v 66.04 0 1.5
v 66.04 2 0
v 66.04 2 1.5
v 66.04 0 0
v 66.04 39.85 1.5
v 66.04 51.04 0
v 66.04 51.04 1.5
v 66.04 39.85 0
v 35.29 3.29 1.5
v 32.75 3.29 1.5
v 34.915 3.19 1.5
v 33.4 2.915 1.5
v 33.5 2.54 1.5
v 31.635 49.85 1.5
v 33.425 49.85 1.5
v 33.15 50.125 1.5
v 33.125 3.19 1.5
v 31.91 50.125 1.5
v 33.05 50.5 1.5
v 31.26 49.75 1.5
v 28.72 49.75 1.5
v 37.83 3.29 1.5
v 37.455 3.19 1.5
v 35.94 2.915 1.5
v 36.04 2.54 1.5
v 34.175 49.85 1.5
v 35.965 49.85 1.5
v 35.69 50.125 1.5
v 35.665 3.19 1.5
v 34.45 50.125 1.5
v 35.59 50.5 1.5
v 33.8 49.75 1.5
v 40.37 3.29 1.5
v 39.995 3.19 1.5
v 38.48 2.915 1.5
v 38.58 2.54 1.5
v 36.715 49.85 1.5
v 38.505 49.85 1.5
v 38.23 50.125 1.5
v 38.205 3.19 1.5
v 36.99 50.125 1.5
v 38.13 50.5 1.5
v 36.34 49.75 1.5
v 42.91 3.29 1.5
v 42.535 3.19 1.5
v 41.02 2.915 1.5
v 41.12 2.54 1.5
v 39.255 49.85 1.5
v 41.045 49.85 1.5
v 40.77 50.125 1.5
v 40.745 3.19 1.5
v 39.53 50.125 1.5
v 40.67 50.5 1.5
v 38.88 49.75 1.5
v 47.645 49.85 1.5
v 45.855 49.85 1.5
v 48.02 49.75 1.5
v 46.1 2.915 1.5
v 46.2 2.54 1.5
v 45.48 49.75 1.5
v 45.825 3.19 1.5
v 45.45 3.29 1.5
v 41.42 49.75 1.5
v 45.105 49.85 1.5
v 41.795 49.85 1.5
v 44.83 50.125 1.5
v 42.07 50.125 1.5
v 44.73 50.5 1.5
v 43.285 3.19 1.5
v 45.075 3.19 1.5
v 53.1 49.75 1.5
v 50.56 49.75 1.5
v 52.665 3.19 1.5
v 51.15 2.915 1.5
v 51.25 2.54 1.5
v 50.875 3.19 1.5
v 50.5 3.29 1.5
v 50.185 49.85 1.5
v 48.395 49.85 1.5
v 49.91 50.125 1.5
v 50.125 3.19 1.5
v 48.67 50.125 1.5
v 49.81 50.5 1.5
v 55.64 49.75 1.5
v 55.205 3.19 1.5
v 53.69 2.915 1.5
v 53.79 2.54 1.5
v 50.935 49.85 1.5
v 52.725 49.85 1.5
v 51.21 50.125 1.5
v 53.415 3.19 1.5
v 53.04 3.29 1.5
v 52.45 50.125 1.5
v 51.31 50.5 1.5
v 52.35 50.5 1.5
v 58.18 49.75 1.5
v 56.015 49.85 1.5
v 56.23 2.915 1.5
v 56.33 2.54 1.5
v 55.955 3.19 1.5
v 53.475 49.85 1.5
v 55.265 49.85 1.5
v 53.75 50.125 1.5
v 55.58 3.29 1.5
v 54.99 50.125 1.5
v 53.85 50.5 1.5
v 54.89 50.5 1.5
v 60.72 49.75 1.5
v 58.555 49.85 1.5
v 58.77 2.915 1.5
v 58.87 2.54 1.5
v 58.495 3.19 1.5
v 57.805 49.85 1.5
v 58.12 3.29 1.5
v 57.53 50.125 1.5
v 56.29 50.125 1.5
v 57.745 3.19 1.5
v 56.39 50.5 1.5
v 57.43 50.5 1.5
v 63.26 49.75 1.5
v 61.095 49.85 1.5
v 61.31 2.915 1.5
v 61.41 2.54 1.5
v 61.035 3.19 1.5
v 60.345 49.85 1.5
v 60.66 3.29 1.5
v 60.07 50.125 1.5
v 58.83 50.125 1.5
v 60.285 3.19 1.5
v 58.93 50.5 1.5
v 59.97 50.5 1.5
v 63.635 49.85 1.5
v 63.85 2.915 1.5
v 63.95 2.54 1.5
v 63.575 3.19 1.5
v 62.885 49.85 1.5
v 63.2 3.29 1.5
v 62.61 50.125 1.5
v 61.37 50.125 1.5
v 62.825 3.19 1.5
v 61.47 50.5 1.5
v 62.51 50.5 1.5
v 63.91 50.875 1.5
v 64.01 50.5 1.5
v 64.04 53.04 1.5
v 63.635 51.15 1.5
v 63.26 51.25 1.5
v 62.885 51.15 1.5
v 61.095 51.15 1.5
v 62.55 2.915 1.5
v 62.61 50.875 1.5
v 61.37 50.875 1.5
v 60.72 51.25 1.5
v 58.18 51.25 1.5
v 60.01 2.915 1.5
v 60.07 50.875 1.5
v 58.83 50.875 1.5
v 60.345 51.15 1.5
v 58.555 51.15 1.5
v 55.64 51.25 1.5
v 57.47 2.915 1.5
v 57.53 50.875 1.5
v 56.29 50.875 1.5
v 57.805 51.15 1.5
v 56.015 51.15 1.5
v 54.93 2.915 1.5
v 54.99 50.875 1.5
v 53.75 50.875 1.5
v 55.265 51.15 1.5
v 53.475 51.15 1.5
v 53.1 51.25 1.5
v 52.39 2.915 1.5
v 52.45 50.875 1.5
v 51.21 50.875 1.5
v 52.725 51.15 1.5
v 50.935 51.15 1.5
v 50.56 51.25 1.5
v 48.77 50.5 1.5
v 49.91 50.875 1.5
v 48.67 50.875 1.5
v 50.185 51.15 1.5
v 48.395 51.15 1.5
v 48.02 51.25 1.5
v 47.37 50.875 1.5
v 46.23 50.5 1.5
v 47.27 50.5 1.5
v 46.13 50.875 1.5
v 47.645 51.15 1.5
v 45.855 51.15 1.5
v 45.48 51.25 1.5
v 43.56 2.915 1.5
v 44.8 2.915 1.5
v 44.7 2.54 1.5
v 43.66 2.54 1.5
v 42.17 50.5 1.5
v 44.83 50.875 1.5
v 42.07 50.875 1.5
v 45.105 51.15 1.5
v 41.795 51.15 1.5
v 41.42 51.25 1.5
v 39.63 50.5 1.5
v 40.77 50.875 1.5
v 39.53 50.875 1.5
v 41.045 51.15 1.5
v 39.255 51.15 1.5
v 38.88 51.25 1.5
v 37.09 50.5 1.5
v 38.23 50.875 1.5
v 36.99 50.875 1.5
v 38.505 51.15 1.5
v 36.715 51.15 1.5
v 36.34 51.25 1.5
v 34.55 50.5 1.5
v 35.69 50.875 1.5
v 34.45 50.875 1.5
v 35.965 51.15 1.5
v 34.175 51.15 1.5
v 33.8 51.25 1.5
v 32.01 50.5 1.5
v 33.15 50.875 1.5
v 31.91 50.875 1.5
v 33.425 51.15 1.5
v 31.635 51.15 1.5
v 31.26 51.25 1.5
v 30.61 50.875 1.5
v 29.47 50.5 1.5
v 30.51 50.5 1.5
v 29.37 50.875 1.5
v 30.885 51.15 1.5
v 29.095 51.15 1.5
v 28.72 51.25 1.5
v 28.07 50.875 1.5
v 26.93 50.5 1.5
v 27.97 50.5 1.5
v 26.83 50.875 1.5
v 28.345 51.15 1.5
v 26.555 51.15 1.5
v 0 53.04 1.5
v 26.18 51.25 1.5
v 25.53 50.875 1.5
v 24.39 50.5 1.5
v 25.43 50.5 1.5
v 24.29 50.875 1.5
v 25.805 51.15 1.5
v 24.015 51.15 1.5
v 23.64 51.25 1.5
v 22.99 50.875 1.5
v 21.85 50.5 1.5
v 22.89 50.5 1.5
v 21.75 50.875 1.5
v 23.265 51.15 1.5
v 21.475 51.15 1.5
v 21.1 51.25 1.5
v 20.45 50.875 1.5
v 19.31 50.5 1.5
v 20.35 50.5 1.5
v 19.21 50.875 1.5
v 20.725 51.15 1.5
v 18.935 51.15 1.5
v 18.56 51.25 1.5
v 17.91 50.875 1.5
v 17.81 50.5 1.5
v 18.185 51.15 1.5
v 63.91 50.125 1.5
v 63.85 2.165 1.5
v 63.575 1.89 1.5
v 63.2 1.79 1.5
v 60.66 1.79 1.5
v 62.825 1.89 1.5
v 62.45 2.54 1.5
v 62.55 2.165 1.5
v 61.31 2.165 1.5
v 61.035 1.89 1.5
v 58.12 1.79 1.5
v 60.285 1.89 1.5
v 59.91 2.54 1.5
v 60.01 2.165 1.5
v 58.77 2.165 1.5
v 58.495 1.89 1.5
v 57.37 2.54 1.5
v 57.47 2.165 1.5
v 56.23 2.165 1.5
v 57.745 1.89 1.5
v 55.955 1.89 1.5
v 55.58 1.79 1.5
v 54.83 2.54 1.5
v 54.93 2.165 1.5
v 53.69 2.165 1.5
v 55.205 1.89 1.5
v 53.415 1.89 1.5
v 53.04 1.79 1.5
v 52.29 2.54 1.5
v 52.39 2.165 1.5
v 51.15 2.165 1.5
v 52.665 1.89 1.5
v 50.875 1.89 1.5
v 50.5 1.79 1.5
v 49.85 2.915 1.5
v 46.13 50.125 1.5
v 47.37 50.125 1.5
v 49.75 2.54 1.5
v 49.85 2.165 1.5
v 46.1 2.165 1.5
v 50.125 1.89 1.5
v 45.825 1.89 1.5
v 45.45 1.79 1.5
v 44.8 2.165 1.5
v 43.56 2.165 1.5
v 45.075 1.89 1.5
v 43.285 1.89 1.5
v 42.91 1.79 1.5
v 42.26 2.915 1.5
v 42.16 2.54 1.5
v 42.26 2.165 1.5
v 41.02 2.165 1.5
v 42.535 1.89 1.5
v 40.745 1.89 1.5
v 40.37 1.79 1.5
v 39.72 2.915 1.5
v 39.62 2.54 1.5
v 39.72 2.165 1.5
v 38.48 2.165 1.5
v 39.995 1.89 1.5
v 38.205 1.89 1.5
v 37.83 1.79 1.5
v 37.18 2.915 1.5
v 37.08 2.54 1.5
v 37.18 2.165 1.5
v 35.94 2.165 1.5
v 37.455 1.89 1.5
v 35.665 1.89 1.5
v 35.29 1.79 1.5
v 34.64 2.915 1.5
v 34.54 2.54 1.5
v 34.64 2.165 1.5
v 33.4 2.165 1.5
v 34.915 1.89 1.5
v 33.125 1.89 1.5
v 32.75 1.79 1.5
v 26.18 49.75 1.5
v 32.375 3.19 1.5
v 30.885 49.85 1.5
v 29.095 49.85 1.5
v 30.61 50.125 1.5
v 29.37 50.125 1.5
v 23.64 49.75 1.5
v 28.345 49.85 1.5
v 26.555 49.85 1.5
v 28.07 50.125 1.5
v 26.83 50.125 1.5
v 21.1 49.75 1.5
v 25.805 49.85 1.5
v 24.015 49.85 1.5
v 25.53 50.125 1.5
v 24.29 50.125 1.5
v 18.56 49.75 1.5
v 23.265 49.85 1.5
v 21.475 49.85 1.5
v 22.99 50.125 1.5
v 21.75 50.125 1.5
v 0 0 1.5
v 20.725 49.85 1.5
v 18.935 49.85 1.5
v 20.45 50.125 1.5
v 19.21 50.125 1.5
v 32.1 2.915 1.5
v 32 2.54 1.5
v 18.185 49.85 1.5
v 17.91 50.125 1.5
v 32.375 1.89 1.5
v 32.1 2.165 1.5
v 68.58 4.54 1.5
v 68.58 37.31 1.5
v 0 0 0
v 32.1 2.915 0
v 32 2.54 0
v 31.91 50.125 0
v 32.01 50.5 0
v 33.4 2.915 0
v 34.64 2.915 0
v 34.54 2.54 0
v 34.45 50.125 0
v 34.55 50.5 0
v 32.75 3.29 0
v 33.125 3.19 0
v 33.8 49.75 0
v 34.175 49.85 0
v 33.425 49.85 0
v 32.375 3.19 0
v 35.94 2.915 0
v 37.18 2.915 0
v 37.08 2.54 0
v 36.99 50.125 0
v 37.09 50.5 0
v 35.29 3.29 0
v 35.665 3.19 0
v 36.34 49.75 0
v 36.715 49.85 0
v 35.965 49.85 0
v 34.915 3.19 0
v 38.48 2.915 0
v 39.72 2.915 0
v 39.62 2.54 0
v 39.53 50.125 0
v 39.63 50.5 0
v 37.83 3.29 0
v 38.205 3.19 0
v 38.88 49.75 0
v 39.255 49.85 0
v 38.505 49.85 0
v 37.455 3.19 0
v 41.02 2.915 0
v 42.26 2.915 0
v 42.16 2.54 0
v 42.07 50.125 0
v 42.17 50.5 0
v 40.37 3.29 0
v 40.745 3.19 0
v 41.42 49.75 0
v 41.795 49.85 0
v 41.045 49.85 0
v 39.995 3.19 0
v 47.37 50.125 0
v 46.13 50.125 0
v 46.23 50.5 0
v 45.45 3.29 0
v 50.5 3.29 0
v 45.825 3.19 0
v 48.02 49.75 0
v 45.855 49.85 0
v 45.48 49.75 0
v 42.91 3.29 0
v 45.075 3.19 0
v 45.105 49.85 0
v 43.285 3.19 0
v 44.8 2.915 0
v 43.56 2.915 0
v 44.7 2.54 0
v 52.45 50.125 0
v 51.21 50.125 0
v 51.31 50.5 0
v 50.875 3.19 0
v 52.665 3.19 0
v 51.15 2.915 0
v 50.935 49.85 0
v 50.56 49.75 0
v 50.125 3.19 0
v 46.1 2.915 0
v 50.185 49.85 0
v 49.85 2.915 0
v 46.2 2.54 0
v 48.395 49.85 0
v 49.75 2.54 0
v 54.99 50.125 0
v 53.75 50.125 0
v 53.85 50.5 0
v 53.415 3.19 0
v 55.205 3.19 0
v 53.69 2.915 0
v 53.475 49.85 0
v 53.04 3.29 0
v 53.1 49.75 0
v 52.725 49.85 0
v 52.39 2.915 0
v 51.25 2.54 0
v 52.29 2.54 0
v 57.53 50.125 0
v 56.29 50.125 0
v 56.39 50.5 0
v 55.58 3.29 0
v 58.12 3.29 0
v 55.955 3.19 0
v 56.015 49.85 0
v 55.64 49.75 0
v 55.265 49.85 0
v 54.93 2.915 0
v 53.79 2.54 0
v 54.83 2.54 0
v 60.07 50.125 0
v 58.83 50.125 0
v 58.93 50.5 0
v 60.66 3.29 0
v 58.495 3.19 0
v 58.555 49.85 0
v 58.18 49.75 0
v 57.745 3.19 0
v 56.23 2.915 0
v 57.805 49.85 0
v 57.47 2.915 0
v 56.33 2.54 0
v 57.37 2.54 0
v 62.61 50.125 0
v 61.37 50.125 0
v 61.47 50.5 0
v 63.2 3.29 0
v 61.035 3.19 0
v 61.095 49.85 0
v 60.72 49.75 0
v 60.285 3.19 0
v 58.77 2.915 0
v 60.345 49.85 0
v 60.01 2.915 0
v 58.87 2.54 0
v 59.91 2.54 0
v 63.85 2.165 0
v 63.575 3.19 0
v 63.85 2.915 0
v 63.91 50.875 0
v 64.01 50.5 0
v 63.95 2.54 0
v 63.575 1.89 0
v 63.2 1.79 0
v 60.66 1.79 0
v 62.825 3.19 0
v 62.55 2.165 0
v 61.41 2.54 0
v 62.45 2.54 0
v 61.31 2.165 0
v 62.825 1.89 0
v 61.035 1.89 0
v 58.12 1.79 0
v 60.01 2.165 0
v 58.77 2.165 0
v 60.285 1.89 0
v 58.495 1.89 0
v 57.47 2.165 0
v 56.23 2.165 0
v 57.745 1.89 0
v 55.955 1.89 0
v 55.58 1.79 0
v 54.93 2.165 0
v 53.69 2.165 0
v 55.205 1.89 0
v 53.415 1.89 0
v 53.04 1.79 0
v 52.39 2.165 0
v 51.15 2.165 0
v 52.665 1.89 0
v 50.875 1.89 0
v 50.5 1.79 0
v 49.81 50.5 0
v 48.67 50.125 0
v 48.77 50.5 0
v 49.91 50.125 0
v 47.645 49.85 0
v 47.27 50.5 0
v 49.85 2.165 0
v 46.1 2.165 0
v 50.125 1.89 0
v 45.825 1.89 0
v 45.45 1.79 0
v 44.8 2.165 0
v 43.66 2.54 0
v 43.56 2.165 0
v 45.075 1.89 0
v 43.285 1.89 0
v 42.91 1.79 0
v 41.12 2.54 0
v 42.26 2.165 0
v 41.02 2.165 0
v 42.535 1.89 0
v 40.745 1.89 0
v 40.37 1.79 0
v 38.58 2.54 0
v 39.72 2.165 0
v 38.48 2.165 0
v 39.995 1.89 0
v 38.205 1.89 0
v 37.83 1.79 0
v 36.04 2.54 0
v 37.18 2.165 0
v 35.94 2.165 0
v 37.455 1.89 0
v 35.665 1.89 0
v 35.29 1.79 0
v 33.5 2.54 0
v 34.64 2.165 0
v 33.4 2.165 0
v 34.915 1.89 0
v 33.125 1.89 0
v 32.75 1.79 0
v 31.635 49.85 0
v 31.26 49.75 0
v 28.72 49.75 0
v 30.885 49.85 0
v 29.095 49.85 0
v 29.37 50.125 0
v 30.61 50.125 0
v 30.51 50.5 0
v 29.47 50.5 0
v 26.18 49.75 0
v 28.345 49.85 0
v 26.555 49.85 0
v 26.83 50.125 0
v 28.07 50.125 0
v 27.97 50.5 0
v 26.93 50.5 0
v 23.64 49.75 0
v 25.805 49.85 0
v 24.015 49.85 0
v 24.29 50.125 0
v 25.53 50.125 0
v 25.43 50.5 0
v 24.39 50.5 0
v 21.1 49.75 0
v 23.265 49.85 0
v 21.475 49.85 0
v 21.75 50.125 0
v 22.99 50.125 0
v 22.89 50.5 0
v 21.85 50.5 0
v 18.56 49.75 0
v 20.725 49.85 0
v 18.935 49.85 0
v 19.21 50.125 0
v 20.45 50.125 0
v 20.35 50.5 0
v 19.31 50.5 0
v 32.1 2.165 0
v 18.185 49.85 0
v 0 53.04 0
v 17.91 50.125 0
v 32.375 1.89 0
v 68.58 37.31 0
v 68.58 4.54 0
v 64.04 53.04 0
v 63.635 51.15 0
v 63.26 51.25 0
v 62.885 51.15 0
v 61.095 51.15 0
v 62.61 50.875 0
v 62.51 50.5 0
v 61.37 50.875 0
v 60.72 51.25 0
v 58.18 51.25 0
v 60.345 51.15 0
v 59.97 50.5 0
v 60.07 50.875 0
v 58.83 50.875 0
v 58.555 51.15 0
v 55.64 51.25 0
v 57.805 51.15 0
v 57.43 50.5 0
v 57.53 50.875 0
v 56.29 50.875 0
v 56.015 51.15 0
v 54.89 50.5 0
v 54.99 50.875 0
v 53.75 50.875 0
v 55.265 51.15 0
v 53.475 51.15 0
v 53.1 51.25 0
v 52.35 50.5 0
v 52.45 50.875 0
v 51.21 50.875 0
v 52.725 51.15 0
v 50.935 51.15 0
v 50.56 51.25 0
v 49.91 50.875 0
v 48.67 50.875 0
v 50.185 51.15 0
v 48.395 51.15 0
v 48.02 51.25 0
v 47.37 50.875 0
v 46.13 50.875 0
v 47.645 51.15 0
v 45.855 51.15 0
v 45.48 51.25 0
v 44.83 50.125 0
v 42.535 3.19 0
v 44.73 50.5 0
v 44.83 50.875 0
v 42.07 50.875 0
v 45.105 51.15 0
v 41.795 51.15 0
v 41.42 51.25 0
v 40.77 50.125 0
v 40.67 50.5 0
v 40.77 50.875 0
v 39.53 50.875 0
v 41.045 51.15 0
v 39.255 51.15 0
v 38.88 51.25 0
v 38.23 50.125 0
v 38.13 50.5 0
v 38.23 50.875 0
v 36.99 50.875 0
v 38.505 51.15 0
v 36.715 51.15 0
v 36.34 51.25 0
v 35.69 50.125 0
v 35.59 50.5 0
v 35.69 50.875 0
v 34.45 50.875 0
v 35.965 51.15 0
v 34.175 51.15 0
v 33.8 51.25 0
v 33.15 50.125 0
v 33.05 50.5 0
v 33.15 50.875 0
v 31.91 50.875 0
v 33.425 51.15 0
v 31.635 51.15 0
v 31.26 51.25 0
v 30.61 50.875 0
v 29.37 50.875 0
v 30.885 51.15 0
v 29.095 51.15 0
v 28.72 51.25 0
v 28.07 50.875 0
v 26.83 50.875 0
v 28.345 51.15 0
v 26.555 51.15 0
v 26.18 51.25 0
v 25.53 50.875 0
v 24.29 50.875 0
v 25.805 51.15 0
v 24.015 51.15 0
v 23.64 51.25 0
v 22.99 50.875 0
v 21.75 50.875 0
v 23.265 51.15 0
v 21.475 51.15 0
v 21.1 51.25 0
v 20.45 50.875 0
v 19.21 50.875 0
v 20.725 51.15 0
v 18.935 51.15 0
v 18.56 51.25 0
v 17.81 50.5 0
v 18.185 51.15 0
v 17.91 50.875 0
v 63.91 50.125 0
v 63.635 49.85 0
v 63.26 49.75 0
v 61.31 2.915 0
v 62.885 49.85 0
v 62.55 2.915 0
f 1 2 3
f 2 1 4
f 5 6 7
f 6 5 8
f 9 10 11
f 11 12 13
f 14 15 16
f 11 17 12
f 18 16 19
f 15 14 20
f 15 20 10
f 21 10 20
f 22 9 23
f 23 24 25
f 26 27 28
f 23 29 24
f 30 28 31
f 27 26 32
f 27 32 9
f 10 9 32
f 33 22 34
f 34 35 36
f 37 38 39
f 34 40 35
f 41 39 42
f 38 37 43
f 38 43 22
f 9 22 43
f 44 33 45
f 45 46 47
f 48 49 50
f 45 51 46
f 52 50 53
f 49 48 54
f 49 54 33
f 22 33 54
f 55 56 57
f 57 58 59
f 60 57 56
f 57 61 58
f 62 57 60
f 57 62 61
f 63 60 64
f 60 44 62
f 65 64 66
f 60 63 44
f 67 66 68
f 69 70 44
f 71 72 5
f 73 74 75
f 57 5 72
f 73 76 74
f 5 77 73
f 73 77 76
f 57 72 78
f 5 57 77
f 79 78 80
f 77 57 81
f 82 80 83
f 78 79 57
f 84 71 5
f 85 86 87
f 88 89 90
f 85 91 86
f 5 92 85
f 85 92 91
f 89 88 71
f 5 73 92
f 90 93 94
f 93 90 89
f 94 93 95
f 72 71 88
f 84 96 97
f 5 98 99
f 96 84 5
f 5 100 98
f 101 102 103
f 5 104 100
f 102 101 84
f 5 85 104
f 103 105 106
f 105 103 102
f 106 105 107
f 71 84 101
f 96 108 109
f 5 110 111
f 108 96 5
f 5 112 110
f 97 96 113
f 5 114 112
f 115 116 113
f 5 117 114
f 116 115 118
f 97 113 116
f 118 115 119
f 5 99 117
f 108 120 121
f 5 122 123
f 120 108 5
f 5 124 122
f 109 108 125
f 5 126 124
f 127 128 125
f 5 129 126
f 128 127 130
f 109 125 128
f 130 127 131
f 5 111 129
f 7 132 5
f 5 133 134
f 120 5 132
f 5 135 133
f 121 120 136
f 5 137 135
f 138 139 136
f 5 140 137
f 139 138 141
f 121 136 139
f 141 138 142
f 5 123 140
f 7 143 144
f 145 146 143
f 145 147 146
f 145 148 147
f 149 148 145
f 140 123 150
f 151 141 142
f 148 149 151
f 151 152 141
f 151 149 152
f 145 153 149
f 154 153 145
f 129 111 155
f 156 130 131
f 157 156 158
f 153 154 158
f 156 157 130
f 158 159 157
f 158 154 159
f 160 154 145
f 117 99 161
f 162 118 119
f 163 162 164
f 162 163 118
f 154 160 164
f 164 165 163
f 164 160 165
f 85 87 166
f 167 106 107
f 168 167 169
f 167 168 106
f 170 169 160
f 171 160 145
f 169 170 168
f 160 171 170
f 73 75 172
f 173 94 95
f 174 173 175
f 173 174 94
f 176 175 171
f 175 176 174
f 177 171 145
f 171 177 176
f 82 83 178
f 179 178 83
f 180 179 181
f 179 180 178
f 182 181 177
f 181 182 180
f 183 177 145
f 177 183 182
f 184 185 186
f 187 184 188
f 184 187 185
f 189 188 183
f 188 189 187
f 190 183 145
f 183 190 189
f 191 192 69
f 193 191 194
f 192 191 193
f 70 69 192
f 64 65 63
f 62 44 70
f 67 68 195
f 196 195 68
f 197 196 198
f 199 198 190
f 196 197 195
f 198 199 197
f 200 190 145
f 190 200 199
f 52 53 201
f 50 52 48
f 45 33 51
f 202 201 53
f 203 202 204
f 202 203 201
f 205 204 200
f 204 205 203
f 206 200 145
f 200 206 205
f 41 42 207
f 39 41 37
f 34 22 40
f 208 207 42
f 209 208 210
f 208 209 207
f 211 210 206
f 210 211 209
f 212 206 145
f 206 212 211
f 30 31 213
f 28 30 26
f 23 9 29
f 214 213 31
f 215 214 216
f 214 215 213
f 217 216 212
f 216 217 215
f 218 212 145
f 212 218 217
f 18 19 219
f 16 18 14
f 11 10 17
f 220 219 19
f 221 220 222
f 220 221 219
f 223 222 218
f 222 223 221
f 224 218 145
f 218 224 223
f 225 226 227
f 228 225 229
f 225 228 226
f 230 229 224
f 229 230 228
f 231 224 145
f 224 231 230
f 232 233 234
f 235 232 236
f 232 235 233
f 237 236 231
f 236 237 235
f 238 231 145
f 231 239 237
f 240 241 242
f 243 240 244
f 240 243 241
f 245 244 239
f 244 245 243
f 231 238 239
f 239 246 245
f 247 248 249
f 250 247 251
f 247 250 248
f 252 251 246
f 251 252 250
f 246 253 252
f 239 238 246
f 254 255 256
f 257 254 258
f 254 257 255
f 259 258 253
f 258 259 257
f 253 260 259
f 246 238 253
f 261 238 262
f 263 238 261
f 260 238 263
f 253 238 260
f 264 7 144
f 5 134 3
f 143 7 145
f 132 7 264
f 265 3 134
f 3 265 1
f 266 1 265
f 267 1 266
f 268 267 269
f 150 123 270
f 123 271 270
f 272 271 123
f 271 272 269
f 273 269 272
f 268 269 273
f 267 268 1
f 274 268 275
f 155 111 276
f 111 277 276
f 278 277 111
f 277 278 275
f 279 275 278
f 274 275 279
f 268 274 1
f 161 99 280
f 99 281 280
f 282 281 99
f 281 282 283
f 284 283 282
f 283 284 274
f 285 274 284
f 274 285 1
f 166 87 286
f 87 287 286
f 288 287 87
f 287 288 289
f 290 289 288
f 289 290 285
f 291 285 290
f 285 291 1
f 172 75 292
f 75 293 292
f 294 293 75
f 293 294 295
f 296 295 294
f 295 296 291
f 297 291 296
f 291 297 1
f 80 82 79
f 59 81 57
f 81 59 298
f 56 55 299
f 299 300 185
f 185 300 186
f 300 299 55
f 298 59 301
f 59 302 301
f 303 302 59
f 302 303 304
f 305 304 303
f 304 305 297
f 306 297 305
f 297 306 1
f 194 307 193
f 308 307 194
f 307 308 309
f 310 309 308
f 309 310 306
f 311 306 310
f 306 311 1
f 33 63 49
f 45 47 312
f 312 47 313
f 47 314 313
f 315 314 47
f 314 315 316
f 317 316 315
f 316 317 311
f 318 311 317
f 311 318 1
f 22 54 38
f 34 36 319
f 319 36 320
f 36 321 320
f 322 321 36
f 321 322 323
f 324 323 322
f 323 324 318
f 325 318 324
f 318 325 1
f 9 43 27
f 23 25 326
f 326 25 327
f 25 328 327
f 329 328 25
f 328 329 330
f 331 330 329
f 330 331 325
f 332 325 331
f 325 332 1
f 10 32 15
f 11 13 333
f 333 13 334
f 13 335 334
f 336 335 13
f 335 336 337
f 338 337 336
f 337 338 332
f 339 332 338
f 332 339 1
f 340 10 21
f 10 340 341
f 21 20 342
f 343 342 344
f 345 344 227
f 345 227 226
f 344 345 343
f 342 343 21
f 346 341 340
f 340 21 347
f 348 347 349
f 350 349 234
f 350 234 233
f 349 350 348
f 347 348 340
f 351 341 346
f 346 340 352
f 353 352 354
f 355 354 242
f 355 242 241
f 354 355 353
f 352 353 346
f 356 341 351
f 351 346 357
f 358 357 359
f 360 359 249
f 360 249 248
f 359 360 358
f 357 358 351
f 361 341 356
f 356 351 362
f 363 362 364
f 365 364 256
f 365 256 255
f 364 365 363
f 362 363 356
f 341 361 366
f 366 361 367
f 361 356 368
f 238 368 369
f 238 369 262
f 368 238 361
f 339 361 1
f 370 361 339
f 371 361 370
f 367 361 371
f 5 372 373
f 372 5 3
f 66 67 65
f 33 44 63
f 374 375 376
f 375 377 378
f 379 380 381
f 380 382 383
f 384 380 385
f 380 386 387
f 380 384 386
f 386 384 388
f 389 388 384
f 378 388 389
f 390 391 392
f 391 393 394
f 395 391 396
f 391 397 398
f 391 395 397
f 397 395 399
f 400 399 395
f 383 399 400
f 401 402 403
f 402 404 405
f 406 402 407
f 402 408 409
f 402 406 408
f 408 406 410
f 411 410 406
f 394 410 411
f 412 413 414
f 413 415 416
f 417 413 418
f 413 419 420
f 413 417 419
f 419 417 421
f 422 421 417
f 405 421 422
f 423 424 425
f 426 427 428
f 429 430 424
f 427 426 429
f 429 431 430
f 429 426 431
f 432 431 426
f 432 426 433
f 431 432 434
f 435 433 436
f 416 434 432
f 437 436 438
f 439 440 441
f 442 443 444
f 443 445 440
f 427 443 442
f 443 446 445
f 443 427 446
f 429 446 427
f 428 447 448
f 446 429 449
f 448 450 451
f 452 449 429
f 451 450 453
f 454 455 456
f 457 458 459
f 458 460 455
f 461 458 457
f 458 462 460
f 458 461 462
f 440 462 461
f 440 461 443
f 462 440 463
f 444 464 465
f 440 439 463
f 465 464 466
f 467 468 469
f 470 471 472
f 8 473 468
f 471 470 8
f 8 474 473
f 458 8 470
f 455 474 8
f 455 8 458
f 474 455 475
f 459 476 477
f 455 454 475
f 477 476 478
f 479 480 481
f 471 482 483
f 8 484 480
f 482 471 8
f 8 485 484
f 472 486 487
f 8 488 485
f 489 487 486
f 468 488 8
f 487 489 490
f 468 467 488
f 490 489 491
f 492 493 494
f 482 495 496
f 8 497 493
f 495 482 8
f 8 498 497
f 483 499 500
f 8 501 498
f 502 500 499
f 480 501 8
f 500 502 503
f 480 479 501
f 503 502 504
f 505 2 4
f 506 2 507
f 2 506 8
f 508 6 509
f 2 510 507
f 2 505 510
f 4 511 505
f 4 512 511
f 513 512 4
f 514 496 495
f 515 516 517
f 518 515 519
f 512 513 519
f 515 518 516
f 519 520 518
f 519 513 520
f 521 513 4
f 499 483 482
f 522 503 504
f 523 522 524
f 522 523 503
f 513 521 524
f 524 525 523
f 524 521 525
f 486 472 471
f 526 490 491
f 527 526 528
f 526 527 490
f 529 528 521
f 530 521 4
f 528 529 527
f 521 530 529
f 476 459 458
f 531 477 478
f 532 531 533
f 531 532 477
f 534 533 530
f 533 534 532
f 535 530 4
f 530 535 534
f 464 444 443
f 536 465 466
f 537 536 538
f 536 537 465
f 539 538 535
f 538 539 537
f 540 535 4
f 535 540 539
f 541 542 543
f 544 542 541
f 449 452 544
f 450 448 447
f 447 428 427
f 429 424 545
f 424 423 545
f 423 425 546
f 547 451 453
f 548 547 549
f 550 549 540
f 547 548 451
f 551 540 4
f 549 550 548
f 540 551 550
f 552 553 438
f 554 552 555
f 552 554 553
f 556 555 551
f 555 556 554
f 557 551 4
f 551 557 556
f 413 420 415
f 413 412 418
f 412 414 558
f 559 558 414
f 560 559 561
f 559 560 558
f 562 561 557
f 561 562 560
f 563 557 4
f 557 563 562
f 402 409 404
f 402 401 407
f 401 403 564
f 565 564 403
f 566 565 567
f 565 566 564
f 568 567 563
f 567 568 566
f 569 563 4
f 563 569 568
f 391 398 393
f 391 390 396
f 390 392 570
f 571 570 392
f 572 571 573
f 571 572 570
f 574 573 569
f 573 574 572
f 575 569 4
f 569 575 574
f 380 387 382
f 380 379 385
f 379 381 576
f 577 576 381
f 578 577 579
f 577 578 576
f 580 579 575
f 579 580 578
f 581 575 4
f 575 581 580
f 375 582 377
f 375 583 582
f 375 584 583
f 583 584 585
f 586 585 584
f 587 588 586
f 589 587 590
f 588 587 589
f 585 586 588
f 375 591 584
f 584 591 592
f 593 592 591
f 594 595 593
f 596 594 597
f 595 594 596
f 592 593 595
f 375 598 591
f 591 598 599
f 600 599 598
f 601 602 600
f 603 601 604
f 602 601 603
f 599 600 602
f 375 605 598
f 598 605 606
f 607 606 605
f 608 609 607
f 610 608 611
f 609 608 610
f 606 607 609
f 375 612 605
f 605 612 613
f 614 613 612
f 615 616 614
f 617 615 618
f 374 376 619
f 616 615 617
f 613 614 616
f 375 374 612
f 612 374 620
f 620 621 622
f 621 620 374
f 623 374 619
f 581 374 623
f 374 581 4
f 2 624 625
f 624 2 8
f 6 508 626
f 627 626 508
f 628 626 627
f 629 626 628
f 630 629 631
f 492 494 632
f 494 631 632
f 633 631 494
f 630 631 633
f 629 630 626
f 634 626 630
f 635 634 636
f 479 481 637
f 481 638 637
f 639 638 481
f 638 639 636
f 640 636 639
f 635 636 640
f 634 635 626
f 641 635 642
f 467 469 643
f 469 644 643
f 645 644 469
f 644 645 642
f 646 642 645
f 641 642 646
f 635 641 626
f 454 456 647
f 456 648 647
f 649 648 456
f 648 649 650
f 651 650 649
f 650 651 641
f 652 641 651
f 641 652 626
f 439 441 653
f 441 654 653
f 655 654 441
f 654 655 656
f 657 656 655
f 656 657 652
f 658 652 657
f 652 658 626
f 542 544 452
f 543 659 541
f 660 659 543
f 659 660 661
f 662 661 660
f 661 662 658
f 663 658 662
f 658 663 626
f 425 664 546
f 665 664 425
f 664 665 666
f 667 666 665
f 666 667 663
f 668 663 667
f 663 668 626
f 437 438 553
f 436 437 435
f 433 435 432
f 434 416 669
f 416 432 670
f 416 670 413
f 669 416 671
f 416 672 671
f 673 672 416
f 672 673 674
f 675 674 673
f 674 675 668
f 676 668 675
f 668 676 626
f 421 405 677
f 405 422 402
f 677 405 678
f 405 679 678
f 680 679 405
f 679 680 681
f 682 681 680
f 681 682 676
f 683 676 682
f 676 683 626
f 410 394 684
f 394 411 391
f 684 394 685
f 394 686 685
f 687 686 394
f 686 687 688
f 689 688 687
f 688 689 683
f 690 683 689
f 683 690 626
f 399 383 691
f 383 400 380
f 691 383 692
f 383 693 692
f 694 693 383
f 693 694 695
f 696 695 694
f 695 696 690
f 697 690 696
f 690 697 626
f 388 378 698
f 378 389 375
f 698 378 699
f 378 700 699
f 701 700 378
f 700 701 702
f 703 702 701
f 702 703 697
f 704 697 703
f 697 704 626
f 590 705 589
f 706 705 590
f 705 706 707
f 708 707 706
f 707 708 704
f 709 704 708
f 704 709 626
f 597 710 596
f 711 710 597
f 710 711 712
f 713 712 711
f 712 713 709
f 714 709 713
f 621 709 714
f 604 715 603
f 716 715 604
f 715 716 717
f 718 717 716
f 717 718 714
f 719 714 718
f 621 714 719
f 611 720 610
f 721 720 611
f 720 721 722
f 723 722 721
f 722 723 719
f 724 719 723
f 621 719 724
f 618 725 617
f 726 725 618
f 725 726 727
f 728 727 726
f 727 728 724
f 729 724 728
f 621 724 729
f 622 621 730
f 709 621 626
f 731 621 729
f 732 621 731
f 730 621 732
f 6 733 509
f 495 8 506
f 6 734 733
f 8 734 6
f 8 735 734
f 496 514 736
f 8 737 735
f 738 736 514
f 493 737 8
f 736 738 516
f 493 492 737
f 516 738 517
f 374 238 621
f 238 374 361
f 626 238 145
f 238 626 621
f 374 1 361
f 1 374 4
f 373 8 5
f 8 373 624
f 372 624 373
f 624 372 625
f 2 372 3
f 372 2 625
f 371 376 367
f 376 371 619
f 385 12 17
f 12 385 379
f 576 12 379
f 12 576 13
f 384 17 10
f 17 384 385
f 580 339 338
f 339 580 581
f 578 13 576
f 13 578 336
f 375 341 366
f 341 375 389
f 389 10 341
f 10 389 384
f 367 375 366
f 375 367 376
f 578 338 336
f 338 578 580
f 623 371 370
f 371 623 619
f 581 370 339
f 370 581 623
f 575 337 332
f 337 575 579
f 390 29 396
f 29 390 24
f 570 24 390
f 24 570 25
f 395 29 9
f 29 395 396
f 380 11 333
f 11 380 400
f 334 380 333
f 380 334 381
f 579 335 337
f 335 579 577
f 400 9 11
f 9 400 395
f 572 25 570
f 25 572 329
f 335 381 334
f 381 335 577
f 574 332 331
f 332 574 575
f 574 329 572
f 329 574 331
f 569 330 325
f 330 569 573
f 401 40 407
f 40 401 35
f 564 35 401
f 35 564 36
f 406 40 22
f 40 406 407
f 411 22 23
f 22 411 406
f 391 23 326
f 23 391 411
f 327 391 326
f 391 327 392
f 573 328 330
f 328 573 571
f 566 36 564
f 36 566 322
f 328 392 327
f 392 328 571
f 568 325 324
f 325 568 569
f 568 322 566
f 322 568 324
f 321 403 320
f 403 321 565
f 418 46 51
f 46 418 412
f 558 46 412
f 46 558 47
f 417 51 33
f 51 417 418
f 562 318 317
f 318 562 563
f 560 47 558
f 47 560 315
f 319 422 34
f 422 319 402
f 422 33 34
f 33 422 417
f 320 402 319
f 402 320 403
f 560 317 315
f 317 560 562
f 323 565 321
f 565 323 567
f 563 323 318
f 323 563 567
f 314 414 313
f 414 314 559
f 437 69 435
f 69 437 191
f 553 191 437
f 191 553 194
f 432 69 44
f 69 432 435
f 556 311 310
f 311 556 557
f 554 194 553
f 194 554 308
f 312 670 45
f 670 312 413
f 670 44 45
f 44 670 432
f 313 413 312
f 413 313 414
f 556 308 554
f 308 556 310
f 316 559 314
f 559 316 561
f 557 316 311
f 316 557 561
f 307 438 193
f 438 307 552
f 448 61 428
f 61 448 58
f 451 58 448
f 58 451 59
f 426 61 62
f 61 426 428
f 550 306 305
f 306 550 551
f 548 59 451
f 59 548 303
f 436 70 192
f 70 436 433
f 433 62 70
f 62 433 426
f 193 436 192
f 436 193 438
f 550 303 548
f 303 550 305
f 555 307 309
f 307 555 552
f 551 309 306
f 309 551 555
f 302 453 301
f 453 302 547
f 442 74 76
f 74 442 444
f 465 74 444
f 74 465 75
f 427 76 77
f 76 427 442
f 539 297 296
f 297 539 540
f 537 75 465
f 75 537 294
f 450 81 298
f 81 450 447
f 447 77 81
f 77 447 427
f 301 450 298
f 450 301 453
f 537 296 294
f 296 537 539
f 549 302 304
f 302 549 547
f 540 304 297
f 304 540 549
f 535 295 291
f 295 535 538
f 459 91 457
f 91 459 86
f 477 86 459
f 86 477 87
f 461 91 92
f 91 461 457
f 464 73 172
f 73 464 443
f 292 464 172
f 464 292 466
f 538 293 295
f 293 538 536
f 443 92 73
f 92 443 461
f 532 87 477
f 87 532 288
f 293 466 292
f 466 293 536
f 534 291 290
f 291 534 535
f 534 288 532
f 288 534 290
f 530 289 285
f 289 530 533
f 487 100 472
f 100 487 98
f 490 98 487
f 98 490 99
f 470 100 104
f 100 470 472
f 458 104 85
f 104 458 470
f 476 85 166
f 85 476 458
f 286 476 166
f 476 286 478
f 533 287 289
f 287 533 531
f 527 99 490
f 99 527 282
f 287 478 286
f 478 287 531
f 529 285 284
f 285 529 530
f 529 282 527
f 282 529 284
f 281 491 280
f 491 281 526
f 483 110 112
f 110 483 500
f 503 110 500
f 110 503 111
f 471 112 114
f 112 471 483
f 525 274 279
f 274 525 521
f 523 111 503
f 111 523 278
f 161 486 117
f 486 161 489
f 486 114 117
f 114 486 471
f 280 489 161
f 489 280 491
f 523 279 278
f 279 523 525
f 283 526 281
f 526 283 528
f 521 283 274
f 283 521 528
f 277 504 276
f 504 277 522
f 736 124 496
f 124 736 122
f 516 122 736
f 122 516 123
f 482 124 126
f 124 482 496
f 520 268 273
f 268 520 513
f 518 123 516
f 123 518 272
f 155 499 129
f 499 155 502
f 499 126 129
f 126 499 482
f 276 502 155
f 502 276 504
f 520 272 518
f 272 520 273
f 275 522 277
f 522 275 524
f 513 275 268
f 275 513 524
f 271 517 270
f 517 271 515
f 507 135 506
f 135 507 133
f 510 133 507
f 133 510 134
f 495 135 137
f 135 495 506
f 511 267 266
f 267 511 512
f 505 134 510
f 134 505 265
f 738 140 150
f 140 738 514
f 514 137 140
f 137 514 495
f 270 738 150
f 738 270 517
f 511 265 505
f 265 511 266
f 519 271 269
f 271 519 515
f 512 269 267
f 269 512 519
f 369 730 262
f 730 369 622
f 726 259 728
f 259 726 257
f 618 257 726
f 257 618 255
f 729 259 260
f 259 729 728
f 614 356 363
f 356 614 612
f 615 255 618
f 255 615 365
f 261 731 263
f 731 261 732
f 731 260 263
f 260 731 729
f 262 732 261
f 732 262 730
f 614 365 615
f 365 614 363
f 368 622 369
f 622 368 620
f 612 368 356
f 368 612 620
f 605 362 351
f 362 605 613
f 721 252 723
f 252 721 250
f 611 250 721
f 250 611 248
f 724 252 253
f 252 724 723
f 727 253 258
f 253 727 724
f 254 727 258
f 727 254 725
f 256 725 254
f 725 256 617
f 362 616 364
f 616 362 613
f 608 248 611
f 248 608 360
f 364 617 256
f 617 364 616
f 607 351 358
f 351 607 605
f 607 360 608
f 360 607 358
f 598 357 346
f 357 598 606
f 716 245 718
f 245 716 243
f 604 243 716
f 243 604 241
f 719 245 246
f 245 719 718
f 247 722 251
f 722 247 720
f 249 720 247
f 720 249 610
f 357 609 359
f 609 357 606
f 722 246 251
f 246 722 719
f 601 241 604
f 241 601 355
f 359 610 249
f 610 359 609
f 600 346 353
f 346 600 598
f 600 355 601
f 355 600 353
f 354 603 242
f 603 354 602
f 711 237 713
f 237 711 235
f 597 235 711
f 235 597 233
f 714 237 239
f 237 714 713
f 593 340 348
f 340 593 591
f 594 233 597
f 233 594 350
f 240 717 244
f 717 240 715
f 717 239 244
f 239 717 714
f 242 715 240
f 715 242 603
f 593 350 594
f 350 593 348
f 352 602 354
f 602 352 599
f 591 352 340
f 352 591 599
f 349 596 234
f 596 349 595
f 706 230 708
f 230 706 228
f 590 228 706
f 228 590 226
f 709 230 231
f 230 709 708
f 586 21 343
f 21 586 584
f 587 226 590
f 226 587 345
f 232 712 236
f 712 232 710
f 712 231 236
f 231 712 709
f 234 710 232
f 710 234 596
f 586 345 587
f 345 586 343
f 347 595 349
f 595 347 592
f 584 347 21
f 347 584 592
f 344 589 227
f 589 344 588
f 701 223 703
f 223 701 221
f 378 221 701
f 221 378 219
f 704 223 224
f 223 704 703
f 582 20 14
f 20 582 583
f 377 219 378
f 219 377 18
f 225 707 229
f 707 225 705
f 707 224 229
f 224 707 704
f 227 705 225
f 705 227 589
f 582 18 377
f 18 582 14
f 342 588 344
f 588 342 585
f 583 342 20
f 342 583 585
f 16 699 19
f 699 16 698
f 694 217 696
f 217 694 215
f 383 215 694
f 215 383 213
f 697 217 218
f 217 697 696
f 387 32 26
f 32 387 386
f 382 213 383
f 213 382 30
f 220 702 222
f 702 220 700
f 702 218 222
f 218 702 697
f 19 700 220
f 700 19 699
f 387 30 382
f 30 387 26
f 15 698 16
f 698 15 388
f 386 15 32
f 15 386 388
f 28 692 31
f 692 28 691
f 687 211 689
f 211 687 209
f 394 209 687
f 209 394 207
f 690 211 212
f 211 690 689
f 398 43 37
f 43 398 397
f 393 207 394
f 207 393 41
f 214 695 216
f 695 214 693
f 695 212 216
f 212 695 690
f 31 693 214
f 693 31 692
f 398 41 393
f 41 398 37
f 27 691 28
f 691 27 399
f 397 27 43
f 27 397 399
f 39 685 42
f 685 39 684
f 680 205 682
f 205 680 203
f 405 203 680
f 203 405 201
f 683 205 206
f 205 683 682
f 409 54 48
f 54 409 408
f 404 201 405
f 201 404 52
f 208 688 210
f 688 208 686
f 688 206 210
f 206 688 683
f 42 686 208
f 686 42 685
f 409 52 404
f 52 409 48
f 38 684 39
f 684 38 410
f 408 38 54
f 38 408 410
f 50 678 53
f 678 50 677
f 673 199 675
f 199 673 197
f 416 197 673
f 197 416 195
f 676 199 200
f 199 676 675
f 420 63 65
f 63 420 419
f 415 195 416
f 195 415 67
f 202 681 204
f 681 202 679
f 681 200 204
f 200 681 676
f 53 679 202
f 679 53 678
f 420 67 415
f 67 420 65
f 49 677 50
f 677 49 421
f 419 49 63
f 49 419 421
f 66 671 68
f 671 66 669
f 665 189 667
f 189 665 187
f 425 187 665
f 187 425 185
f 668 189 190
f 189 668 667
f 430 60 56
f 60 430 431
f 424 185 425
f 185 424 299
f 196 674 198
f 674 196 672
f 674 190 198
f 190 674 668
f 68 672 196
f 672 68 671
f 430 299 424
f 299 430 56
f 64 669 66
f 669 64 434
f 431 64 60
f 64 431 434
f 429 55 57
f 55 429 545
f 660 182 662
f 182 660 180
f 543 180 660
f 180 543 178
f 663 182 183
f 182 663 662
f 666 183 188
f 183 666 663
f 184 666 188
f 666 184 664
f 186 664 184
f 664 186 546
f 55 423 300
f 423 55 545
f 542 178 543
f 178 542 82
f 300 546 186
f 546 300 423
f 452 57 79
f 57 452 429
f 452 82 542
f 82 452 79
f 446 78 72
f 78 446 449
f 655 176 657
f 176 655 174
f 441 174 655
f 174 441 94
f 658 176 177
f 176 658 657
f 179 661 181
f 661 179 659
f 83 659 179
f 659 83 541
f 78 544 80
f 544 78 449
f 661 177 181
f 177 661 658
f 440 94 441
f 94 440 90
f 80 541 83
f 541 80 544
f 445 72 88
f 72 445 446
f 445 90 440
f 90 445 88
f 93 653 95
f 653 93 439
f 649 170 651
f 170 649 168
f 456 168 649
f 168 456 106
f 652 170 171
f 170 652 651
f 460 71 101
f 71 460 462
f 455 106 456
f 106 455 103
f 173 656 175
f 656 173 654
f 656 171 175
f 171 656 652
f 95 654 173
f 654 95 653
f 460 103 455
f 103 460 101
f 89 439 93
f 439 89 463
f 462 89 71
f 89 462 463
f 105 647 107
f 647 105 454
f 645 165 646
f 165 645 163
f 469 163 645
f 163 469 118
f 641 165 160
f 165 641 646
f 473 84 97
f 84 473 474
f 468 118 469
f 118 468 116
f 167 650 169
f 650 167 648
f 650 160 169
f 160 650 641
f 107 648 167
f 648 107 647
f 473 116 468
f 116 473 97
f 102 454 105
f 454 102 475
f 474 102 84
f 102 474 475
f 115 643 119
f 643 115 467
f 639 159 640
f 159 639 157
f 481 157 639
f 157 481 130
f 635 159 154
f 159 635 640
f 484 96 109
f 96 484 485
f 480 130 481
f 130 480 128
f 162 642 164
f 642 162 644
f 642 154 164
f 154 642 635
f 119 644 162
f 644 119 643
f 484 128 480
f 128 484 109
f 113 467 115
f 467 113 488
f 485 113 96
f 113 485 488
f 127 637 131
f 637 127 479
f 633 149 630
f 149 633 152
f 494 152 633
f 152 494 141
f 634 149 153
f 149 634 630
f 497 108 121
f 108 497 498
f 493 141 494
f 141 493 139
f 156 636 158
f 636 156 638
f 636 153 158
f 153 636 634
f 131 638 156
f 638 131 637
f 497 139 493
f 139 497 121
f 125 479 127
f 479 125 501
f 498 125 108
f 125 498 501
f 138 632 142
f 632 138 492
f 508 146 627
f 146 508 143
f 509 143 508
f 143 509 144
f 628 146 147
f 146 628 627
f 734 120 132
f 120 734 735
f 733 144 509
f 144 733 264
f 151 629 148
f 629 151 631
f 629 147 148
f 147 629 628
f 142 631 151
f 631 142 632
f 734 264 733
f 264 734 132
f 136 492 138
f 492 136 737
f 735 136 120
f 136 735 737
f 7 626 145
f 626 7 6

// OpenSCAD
shield_UNO(1.5);

module shield_UNO(h)
{
difference(){
union(){
cube([66.04,50.5+2.54,h]);
translate([65.04,2,0])hull(){
cube([1,37.85,h]);
translate([1,2.54,0])cube([2.54,32.77,h]);
}
}
$fn=12;
translate([32.75,2.54,-1])pin20mil(6,1.5,h+2);
translate([50.5,2.54,-1])pin20mil(6,1.5,h+2);
translate([18.56,50.5,-1])pin20mil(10,1.5,h+2);
translate([45.48,50.5,-1])pin20mil(8,1.5,h+2);
translate([66.04,53.04,-1])cylinder(d=4,h=5,$fn=4);
}
}

module pin20mil(n,d_paso,h_paso)
{
for (i=[1:n]){
     translate([(i-1)*2.54,0,0])cylinder(d=d_paso,h=h_paso,$fn=12);
}
}
